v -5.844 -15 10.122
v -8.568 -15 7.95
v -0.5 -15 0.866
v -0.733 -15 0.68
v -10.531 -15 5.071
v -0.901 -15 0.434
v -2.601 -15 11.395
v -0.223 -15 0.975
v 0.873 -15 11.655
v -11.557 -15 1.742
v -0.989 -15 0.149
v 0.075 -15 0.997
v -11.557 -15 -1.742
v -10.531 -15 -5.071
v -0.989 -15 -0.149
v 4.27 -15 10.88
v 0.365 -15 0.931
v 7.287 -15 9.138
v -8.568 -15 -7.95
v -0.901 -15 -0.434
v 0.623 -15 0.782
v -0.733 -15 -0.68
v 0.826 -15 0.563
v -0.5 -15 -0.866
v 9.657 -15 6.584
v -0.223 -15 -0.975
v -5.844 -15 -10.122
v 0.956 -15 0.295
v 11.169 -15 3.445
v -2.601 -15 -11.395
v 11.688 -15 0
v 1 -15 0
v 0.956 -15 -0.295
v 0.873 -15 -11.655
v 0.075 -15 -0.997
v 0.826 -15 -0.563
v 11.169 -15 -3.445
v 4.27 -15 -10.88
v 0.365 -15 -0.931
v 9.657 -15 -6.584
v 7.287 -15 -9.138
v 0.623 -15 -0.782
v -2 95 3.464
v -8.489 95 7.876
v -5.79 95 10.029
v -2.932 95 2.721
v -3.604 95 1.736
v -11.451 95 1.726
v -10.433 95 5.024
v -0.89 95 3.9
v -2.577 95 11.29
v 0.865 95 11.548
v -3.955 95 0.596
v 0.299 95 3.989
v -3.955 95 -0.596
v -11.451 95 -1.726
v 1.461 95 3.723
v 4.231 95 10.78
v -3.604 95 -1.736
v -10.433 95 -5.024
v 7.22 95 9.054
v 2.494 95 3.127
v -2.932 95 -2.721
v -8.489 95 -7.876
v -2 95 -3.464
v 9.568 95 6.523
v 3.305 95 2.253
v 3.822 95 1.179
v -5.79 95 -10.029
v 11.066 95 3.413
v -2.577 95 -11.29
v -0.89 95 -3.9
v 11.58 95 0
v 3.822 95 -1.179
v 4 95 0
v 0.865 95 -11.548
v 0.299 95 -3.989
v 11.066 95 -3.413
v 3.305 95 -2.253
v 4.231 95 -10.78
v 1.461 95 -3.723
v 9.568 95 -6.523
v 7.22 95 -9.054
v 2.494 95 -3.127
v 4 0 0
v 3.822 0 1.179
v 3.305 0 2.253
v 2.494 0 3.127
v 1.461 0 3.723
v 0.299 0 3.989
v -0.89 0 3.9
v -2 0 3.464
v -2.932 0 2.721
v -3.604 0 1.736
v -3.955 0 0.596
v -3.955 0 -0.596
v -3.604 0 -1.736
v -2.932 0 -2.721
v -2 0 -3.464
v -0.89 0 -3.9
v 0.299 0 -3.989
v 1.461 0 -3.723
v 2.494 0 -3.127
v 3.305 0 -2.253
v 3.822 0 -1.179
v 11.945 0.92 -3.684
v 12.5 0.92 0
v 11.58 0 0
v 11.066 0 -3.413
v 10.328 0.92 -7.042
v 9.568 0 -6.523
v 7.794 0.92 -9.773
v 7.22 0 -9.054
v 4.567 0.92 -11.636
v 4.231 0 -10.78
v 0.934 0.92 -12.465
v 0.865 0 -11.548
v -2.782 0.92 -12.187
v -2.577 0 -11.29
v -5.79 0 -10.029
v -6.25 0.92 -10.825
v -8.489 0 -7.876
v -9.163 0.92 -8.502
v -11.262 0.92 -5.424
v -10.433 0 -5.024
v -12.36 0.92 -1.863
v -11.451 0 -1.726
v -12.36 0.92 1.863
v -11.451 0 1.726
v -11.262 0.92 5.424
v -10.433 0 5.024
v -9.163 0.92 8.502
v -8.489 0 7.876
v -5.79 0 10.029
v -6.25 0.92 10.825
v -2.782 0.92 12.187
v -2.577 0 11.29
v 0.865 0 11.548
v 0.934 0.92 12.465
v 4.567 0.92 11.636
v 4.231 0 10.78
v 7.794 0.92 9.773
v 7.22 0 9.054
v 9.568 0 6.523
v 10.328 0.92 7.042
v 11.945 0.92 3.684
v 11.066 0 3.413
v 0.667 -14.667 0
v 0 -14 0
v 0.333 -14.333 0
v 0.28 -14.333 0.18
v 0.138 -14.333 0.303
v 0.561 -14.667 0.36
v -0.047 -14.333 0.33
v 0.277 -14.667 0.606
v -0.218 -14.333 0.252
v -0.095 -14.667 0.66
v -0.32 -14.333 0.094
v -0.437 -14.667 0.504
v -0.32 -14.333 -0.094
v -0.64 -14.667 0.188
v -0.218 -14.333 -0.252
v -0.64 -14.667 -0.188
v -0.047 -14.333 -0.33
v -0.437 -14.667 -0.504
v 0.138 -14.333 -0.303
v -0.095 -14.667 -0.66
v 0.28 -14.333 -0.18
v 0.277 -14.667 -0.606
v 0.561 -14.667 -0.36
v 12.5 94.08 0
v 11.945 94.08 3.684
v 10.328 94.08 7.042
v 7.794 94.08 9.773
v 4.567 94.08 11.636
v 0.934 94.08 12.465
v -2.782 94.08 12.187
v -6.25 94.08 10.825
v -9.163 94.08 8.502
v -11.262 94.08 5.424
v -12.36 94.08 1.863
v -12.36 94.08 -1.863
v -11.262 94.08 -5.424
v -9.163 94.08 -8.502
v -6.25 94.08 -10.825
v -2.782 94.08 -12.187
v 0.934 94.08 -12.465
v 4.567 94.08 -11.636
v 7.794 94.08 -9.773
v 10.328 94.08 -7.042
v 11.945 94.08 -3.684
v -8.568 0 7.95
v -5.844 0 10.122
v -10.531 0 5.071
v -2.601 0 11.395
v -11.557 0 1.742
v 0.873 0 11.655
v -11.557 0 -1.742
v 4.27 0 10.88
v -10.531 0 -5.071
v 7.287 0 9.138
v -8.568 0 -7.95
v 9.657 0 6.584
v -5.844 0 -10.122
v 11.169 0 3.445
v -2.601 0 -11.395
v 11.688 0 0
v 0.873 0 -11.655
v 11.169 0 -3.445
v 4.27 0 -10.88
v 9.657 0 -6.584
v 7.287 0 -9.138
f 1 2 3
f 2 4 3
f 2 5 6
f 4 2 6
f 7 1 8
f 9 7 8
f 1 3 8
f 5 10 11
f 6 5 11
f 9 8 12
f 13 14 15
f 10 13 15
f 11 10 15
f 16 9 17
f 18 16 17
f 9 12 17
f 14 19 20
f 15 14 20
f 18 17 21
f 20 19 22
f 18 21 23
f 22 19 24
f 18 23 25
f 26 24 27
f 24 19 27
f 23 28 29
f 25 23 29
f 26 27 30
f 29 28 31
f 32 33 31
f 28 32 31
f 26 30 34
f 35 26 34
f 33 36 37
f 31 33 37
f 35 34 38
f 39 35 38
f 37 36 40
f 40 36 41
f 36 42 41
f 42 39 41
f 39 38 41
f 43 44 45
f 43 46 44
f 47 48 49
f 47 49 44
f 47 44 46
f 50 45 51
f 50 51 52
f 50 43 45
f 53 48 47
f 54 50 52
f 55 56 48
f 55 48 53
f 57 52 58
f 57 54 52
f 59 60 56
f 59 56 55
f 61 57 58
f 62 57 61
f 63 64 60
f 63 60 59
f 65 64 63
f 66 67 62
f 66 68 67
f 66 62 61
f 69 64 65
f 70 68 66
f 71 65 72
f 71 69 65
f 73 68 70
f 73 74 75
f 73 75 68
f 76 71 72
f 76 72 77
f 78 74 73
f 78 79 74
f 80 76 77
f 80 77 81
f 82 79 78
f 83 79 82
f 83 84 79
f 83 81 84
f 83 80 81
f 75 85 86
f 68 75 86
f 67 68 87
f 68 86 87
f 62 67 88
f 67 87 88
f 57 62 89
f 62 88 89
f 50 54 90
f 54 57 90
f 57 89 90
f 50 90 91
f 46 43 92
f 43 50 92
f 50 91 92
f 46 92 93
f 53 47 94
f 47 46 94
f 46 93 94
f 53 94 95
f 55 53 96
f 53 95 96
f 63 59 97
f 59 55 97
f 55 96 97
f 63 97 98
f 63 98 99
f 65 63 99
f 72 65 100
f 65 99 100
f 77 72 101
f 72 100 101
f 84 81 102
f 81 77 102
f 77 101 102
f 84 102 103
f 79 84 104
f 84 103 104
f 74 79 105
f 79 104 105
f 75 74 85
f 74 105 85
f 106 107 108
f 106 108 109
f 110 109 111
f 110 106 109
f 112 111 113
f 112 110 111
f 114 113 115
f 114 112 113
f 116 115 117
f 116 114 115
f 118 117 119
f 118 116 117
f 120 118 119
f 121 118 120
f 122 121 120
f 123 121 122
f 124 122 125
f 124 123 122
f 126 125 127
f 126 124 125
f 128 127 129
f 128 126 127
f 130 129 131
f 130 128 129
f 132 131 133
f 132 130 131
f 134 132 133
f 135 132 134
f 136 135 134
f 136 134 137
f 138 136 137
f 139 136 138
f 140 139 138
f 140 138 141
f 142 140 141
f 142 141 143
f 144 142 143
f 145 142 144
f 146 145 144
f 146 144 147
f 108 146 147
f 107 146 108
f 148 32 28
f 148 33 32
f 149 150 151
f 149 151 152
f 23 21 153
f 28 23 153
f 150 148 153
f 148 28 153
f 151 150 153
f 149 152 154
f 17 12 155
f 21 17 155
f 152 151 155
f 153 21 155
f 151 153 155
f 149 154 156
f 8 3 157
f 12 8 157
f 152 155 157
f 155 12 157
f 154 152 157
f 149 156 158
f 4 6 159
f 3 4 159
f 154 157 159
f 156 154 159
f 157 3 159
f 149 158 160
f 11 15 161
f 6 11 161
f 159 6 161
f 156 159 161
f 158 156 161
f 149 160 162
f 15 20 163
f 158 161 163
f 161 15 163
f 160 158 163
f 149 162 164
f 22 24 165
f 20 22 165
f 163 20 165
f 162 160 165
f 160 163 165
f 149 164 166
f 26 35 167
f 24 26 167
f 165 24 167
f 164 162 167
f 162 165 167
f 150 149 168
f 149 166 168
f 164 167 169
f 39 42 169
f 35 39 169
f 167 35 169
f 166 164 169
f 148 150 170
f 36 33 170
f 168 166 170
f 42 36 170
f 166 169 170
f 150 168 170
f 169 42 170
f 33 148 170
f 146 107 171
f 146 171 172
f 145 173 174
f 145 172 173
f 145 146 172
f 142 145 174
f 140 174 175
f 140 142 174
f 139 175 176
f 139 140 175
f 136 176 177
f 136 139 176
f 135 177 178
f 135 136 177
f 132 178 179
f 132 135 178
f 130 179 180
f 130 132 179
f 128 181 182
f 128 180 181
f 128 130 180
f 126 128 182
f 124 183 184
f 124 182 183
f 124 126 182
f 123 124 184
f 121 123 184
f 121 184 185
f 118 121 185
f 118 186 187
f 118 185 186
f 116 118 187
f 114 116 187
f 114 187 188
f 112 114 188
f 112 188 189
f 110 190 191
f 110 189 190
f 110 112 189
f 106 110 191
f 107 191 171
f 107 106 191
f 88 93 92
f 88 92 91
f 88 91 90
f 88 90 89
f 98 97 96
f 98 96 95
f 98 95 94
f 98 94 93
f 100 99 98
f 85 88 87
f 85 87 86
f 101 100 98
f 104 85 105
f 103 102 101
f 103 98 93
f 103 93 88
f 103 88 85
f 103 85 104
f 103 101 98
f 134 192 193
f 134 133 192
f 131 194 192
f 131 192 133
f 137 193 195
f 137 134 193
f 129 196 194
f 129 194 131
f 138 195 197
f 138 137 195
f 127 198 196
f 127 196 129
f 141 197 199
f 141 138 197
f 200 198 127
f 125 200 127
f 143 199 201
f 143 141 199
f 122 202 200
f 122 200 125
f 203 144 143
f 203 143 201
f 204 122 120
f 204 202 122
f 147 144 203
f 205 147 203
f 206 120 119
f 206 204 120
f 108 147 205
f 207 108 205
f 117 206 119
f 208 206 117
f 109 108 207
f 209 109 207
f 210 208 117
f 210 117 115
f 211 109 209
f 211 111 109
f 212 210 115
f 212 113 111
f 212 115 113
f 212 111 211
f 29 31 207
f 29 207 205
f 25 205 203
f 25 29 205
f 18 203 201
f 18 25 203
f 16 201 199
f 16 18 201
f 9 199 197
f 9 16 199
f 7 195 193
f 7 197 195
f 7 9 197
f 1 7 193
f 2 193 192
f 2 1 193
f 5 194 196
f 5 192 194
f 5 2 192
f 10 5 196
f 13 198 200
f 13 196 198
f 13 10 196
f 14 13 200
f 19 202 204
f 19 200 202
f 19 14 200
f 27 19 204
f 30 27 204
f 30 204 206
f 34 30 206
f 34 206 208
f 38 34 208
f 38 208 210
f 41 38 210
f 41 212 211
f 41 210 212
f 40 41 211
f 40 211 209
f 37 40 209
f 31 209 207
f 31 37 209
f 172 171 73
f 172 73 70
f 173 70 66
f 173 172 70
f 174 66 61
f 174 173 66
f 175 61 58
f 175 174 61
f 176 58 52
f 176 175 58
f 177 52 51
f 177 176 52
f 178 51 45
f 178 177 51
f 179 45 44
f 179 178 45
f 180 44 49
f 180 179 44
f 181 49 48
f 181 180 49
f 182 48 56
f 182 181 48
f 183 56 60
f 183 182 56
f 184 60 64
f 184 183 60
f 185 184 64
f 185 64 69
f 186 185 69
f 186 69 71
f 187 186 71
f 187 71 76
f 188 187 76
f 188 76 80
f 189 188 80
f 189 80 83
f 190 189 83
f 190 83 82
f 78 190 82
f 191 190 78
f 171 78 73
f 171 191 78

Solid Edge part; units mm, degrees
sketch "Sketch1" plane through (0, 0, 0) normal (0, 0, 1) x (1, 0, 0)
  line L0 (0, 95) -> (11.58, 95)
  line L1 (11.58, 95) -> (12.5, 94.08)
  line L2 (12.5, 94.08) -> (12.5, 0.92)
  line L3 (12.5, 0.92) -> (11.58, 0)
  line L4 (11.58, 0) -> (0, 0)
  line L5 (0, 0) -> (0, 95)
revolve "RevolvedProtrusion1" add sketch "Sketch1" angle 360 about axis through (0, 0, 0) along (0, 1, 0)
cosmetic_thread "Thread1" size "M25 x 1.5"
sketch "Sketch2" plane through (0, 0, 0) normal (0, 0, 1) x (1, 0, 0)
  line L0 (0, 95) -> (4, 95)
  line L1 (4, 95) -> (4, 0)
  line L2 (4, 0) -> (0, 0)
  line L3 (0, 0) -> (0, 95)
revolve "RevolvedCutout1" cut sketch "Sketch2" angle 360 about axis through (0, 0, 0) along (0, 1, 0)
sketch "Sketch3" plane through (0, 0, 0) normal (0, 0, 1) x (1, 0, 0)
  line L0 (0, 0) -> (11.688, 0)
  line L1 (11.688, 0) -> (11.688, -15)
  line L2 (11.688, -15) -> (1, -15)
  line L3 (1, -15) -> (0, -14)
  line L4 (0, -14) -> (0, 0)
revolve "RevolvedProtrusion2" add sketch "Sketch3" angle 360 about axis through (0, -14, 0) along (0, 1, 0)
